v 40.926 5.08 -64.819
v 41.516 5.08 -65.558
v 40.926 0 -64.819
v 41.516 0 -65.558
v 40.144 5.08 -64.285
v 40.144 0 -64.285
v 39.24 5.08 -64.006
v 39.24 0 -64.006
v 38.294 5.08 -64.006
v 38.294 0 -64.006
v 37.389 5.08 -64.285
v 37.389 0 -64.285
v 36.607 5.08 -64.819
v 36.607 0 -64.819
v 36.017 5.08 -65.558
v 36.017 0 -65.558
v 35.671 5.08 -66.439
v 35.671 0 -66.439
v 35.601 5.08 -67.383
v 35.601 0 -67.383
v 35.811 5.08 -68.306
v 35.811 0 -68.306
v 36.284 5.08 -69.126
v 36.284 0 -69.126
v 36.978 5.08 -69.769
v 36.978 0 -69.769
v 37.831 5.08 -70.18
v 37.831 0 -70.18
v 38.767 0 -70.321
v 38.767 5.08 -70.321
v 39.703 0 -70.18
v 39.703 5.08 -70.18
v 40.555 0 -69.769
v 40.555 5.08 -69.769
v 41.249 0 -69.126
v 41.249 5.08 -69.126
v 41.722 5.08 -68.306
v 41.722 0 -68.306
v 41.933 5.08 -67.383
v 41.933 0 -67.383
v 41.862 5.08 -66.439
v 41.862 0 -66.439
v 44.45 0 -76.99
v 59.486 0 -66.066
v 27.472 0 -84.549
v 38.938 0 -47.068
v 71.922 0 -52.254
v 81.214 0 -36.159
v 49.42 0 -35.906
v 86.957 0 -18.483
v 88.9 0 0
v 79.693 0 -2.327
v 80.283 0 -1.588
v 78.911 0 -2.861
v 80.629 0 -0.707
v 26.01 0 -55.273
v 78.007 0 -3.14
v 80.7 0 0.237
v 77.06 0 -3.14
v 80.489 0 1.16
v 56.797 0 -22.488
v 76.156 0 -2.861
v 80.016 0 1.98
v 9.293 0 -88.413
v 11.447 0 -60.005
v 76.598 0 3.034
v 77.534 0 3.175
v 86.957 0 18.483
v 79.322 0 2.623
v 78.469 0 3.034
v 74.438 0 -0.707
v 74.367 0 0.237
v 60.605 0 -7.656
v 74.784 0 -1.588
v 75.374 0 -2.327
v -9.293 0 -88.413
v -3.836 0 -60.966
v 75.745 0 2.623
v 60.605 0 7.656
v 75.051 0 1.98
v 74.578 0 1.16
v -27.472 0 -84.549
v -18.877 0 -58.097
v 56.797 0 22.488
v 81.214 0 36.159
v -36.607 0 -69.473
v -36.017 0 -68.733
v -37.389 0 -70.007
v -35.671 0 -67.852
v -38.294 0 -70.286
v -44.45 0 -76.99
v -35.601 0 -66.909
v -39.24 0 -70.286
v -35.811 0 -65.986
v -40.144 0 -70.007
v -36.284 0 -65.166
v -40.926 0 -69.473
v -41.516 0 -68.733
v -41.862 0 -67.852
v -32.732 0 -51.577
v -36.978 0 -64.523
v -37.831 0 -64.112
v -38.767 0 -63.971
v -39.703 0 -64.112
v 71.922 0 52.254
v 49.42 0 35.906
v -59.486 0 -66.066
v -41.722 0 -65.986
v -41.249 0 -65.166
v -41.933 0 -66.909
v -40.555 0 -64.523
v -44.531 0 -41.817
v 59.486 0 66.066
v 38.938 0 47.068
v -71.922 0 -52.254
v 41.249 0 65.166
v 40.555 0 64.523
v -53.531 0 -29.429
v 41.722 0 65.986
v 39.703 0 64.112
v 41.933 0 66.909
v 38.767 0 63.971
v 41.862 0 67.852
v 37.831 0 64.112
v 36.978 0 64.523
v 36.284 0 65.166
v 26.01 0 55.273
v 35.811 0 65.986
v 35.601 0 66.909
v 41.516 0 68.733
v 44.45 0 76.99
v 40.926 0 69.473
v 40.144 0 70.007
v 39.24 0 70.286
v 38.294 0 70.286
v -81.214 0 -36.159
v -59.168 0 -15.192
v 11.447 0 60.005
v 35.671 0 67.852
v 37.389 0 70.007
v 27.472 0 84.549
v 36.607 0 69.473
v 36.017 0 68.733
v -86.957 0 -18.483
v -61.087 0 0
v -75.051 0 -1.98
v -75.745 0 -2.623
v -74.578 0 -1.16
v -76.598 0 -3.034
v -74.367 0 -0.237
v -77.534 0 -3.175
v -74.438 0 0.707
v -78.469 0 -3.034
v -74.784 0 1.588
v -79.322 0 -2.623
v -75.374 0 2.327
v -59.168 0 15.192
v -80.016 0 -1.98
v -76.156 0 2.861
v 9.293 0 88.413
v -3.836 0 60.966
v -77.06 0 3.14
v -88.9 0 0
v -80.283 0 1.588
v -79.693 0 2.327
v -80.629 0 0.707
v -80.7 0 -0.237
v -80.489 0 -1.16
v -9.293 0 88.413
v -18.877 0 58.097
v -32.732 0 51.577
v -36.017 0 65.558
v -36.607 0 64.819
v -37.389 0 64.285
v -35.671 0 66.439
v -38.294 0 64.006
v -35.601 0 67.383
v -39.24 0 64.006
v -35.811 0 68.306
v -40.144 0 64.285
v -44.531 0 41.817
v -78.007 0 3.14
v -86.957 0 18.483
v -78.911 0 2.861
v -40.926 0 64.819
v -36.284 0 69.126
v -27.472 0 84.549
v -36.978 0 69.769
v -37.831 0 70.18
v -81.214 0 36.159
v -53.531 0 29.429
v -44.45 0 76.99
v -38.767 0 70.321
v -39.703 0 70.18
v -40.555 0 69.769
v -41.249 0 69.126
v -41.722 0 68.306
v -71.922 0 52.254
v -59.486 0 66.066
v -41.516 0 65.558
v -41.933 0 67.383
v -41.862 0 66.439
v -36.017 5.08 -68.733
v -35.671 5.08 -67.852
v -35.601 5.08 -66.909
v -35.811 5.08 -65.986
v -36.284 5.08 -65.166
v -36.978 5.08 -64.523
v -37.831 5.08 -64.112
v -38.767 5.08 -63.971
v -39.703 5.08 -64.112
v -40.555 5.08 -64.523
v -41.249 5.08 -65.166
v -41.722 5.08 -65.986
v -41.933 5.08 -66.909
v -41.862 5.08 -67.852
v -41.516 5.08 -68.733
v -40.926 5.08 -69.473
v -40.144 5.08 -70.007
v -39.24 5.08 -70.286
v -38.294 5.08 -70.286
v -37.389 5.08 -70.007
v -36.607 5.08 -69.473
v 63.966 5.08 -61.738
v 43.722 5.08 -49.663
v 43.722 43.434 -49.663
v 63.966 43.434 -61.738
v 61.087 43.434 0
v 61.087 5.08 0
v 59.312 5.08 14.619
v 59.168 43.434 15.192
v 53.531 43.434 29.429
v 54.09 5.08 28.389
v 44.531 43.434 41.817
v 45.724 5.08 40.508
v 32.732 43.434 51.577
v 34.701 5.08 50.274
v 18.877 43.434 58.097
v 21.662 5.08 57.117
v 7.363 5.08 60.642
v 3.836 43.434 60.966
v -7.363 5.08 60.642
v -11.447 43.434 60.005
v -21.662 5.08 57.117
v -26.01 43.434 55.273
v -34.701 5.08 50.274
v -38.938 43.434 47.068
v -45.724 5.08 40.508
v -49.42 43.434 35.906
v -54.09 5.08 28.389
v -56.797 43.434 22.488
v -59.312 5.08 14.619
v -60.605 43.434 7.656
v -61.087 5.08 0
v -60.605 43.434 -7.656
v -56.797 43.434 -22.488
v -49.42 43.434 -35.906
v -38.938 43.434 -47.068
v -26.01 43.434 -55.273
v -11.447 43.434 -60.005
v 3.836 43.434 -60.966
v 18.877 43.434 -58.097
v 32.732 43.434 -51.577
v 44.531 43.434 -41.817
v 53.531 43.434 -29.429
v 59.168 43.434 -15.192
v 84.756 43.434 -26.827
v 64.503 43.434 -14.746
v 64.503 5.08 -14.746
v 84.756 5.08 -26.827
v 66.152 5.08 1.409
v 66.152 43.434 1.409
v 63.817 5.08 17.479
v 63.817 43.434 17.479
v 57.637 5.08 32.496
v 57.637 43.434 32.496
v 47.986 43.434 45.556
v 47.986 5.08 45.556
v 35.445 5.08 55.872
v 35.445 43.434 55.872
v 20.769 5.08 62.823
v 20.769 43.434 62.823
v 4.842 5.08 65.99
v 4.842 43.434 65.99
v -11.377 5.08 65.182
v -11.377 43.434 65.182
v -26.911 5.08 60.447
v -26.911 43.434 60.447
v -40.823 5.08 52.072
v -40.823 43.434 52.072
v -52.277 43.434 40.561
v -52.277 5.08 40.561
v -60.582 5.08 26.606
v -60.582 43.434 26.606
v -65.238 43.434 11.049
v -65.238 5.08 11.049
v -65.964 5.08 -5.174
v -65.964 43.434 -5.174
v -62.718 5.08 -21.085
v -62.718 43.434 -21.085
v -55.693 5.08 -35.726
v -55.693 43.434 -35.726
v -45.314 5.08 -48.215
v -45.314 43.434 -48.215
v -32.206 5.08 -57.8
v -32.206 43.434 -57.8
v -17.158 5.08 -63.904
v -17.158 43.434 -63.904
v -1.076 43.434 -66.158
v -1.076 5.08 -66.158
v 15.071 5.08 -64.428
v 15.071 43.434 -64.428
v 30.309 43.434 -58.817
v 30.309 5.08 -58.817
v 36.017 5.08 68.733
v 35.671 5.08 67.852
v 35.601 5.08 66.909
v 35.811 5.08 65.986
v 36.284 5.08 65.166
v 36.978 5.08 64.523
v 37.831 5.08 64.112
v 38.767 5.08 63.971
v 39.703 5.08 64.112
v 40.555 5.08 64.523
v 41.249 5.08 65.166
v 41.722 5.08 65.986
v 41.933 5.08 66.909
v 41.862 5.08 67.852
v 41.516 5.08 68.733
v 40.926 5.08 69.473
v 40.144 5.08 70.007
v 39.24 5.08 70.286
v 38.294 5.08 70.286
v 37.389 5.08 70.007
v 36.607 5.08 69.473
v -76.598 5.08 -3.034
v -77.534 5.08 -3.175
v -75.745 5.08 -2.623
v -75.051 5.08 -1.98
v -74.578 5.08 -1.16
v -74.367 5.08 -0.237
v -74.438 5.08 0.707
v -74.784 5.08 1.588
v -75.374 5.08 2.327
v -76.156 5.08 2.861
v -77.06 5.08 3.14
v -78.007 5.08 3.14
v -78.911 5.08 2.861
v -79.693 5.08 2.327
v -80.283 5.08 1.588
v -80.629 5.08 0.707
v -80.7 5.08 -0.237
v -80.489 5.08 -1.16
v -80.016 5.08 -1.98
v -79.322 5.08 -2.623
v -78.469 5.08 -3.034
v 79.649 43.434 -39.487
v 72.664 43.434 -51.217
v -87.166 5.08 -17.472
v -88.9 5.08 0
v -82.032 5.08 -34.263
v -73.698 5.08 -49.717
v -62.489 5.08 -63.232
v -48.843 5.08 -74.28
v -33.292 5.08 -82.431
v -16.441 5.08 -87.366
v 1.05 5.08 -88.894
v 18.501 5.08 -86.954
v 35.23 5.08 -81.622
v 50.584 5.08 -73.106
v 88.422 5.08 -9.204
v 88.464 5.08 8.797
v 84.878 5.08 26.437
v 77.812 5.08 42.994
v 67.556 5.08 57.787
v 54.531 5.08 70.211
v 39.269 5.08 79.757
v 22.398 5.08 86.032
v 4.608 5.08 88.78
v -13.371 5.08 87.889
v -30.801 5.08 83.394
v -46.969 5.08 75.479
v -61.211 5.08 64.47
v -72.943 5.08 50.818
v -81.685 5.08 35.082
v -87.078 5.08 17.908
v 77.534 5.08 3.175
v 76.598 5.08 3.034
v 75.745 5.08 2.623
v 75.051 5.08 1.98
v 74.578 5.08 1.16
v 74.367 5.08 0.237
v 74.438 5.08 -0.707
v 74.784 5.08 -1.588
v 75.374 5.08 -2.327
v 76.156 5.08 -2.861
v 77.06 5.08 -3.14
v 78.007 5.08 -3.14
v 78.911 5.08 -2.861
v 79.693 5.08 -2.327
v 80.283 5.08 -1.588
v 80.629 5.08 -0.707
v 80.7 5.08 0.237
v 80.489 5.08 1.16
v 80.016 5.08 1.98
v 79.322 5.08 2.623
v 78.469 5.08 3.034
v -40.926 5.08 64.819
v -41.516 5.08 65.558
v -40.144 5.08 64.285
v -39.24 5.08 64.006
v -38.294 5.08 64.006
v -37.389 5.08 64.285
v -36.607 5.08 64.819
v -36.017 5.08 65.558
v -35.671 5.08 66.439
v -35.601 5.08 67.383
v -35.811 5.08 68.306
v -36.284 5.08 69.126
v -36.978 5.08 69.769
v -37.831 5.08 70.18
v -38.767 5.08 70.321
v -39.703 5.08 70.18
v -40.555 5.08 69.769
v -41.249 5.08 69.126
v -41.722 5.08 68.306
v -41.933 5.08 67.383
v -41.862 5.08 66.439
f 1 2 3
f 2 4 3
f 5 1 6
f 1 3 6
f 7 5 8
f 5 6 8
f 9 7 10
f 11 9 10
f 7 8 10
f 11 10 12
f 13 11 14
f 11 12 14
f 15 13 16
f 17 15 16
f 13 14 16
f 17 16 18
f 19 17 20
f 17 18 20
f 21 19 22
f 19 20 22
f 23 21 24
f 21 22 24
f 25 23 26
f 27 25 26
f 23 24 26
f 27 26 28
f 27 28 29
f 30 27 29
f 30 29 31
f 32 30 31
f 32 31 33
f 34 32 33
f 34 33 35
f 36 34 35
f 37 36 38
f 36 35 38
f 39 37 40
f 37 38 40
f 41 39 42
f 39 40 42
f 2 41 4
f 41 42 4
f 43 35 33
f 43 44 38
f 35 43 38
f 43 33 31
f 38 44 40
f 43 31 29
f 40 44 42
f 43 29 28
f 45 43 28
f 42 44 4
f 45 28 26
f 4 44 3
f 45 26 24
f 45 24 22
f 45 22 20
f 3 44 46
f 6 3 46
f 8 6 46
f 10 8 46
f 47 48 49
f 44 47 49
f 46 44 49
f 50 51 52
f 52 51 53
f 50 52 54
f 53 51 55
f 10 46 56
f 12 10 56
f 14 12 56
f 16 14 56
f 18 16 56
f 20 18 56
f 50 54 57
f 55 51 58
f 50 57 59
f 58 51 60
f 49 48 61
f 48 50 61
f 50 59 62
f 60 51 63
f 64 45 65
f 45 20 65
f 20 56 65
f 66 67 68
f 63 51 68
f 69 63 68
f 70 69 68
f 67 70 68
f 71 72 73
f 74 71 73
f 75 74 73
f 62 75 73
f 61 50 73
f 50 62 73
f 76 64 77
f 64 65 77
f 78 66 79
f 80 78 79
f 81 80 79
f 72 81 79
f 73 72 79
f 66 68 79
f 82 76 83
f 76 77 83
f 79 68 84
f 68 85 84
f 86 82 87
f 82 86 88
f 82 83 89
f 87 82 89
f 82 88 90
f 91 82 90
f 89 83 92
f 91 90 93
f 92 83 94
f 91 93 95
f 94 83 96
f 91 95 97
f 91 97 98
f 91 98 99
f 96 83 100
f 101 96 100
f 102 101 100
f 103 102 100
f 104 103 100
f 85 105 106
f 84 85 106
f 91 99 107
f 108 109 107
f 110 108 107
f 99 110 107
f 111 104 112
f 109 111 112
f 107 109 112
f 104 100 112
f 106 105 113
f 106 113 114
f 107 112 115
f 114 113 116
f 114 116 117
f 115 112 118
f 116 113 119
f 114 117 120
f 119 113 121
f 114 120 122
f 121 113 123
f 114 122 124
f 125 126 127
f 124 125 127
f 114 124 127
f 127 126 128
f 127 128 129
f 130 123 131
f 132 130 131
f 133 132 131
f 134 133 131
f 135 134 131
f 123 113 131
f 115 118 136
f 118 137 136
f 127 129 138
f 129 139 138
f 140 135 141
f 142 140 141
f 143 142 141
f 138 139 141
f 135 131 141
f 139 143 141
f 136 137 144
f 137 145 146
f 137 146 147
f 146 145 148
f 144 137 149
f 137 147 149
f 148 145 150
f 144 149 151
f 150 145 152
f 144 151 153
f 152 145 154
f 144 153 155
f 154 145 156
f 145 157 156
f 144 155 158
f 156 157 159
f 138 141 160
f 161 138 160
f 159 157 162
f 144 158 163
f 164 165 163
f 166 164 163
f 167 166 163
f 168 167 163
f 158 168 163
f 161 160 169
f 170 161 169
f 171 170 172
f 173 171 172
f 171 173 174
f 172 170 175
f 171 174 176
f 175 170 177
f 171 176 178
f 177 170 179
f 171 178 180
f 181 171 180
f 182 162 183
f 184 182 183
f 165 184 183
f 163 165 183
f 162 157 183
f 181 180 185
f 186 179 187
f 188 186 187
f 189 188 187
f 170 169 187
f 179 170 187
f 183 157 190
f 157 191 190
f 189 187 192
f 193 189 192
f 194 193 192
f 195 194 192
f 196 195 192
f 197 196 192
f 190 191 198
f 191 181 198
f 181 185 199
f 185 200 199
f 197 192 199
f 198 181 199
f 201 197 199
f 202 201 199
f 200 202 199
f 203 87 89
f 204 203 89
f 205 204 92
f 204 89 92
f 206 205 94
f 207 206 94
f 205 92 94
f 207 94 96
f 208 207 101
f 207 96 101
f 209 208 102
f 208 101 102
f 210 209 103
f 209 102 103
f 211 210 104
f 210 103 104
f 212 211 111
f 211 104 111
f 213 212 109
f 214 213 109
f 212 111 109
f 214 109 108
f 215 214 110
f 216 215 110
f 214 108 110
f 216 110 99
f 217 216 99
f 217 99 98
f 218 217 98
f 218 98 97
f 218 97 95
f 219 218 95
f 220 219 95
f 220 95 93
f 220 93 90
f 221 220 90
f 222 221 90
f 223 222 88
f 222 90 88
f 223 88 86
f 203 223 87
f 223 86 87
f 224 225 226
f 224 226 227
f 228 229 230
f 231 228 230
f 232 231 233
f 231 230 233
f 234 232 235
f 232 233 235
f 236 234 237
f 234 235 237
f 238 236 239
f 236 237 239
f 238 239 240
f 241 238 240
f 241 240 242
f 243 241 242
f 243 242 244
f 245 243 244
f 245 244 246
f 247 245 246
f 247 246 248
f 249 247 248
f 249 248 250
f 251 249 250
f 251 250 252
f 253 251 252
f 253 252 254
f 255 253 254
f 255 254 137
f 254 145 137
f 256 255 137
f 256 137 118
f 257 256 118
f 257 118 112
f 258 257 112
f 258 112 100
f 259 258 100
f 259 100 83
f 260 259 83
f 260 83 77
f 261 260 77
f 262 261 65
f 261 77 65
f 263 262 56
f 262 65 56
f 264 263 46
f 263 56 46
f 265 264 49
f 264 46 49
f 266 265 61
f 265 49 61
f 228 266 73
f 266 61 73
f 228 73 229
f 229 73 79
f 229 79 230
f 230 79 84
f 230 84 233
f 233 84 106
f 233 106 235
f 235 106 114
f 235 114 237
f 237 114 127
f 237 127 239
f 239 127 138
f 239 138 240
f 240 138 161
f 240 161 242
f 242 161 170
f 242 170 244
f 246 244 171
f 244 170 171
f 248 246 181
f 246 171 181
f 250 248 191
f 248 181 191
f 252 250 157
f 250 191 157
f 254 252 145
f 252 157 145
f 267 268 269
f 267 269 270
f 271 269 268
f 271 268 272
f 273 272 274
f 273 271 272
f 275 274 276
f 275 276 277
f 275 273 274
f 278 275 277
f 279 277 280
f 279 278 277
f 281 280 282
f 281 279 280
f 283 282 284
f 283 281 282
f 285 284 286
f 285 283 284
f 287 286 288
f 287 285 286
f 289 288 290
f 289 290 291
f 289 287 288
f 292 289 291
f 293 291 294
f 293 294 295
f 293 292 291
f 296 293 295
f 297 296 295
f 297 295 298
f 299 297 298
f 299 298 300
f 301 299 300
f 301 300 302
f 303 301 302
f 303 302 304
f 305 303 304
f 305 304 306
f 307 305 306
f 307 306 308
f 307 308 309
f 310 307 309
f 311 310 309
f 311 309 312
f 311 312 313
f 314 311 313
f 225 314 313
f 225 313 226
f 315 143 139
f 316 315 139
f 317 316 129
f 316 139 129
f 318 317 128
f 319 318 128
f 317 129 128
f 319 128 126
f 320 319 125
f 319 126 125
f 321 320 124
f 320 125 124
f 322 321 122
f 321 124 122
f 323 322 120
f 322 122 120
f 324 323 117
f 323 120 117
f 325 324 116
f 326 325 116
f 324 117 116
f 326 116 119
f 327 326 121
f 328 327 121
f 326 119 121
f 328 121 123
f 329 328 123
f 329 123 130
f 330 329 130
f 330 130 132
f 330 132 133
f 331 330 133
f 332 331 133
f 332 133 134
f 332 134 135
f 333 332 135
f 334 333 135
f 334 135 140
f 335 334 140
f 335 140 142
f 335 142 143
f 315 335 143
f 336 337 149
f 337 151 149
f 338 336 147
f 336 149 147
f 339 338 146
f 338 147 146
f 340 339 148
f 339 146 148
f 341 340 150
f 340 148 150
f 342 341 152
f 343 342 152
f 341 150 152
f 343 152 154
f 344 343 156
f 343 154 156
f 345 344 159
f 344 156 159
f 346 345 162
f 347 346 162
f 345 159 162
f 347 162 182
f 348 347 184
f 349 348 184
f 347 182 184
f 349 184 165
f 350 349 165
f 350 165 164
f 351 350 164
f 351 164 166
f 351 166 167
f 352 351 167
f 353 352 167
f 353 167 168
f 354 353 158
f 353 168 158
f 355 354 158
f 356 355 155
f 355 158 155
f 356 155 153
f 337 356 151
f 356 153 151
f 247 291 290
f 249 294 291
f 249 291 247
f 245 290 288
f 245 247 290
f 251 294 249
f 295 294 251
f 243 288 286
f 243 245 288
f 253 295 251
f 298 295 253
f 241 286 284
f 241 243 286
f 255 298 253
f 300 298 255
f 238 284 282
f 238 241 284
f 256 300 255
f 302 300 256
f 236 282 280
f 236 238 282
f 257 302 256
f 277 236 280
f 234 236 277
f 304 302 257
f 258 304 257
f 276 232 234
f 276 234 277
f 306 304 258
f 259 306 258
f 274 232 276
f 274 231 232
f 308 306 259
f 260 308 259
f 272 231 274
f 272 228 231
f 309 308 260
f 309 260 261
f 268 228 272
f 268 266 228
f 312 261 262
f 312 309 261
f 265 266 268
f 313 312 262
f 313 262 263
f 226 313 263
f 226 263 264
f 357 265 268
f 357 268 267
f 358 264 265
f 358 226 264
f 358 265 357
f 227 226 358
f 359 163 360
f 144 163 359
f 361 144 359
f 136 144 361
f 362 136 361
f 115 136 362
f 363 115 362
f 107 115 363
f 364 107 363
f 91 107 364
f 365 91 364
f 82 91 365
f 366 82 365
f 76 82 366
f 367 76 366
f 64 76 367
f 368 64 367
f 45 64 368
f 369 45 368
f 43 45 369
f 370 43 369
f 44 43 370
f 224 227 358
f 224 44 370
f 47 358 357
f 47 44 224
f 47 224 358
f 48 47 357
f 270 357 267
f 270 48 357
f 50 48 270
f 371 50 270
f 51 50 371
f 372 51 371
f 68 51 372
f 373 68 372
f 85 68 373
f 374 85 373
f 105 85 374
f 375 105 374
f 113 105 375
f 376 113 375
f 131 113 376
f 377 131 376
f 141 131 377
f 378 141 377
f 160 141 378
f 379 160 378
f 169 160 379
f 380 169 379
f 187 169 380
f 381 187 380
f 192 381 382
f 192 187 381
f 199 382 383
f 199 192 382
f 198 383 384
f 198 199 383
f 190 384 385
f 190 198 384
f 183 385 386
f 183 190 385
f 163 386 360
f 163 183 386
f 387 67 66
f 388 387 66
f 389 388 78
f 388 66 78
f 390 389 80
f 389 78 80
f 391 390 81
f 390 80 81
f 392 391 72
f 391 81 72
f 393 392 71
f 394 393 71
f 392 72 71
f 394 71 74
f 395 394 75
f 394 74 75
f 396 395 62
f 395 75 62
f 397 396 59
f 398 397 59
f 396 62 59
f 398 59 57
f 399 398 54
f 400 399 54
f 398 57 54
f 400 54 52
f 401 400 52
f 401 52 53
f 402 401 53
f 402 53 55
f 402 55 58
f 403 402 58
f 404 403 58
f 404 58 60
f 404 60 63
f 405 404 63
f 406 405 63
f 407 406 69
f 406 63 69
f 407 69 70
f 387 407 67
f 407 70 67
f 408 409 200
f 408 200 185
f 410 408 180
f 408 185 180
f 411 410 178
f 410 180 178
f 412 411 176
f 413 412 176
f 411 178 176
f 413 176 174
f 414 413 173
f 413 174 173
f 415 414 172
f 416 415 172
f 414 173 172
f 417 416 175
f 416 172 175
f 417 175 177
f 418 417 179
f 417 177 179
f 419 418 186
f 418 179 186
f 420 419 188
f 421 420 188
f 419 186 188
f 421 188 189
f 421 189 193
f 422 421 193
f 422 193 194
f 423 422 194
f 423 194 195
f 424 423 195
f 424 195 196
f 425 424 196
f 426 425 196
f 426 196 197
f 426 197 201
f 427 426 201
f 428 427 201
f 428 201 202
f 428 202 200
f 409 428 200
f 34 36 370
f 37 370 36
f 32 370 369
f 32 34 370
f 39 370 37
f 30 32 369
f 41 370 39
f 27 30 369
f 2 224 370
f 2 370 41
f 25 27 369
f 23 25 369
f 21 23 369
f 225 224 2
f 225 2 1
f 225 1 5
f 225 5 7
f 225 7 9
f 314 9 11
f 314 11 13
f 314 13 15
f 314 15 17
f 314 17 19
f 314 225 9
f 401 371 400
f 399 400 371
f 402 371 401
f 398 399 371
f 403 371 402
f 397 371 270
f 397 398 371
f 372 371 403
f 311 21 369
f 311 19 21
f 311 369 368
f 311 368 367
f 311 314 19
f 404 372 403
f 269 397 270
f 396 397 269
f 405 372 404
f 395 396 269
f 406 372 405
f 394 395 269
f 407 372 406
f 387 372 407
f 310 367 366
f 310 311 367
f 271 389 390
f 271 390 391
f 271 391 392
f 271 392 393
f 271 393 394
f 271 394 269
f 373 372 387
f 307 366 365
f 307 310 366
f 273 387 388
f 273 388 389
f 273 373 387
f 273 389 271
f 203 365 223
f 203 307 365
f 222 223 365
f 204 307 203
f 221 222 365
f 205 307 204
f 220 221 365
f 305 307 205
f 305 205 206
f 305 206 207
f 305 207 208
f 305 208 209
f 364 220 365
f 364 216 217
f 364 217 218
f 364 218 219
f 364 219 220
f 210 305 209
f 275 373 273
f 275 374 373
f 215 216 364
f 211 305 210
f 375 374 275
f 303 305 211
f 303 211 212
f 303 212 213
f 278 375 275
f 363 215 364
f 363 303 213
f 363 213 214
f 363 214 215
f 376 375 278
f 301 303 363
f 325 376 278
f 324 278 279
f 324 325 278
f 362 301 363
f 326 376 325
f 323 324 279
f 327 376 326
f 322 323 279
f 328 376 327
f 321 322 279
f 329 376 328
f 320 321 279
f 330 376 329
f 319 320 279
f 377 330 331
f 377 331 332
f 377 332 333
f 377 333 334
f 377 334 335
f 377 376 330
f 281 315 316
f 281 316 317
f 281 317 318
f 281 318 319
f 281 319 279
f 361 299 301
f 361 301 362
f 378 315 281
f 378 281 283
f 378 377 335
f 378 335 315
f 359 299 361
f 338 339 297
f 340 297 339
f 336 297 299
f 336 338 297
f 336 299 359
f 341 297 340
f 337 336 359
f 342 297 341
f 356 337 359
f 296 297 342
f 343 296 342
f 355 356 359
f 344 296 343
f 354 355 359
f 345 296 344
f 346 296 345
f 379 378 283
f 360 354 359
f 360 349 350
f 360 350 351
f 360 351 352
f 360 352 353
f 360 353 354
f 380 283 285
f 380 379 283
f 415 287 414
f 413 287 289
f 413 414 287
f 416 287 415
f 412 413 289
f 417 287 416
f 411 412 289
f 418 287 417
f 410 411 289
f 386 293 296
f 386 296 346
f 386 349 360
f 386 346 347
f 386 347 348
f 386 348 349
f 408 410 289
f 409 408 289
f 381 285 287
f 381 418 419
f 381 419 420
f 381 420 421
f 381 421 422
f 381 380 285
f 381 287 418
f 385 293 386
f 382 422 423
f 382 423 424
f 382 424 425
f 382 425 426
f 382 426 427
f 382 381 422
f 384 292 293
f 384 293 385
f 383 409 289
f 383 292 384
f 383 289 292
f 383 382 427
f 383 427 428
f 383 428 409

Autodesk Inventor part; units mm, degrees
ref_plane "YZ Plane" through (0, 0, 0) normal (1, 0, 0) x (0, 1, 0)
ref_plane "XZ Plane" through (0, 0, 0) normal (0, 1, 0) x (-1, 0, 0)
ref_plane "XY Plane" through (0, 0, 0) normal (0, 0, 1) x (1, 0, 0)
sketch "Sketch1" plane through (0, 0, 0) normal (0, 1, 0) x (-1, 0, 0)
  circle A0 centre (0, 0) radius 61.087
  circle A1 centre (0, 0) radius 88.9
  dimension "d0" = 122.174
  dimension "d1" = 177.8
extrude "Extrusion1" add sketch "Sketch1" along normal blind 5.08
sketch "Sketch2" plane through (0, 5.08, 0) normal (0, 1, 0) x (1, 0, 0)
  circle A0 centre (0, 0) radius 61.087 projected
  circle A1 centre (0, 0) radius 66.167
  dimension "d4" = 132.334
  dimension "d5" = 122.174
extrude "Extrusion2" add sketch "Sketch2" along normal blind 38.354
sketch "Sketch3" plane through (0, 5.08, 0) normal (0, 1, 0) x (1, 0, 0)
  circle A0 centre (0, 0) radius 66.167 projected
  circle A1 centre (0, 0) radius 88.9 projected
  line L0 (66.167, 0) -> (88.9, 0) construction
  line L1 (66.167, 0) -> (77.5335, 0)
  circle A2 centre (77.5335, 0) radius 3.175
  point P0 (80.7085, 0)
  dimension "d10" = 6.35
  dimension "d8" = 22.733
  dimension "d9" = 11.3665
  dimension "d11" = 8.1915
hole "Hole1" at (77.5335, 5.08, 0) direction (0, -1, 0) diameter 6.35 end through all
pattern_circular "Circular Pattern1" count 6 over 360 about axis through (0, -10, 0) along (0, 1, 0) of "Hole1"
sketch "Sketch4" plane through (0, 5.08, 0) normal (0, 1, 0) x (1, 0, 0)
  circle A0 centre (0, 0) radius 66.167 projected
  line L0 (43.7225, 49.663) -> (63.9658, 61.7381)
  circle A1 centre (0, 0) radius 88.9 projected
  line L1 (64.5029, 14.7462) -> (84.7557, 26.827)
  arc A2 (64.5029, 14.7462) -> (41.6667, 51.4) centre (0, 0) ccw
  arc A3 (81.2449, 36.0899) -> (63.9658, 61.7381) centre (0, 0) ccw
  circle A4 centre (77.5335, 0) radius 3.175 projected
  circle A5 centre (38.7668, 67.146) radius 3.175 projected
extrude "Extrusion3" add sketch "Sketch4" along normal blind 38.354 contours A0 L0 A1 L1 picked at (52.8659, 51.2219)
sketch "Sketch5" plane through (72.0744, 43.434, -52.0431) normal (0.8107358, 0, -0.5854122) x (0, 1, 0)
  circle A0 centre (-18.8086, 0) radius 3.175
  point P0 (-43.434, 0)
  dimension "d24" = 6.35
properties part number "flangev3"
